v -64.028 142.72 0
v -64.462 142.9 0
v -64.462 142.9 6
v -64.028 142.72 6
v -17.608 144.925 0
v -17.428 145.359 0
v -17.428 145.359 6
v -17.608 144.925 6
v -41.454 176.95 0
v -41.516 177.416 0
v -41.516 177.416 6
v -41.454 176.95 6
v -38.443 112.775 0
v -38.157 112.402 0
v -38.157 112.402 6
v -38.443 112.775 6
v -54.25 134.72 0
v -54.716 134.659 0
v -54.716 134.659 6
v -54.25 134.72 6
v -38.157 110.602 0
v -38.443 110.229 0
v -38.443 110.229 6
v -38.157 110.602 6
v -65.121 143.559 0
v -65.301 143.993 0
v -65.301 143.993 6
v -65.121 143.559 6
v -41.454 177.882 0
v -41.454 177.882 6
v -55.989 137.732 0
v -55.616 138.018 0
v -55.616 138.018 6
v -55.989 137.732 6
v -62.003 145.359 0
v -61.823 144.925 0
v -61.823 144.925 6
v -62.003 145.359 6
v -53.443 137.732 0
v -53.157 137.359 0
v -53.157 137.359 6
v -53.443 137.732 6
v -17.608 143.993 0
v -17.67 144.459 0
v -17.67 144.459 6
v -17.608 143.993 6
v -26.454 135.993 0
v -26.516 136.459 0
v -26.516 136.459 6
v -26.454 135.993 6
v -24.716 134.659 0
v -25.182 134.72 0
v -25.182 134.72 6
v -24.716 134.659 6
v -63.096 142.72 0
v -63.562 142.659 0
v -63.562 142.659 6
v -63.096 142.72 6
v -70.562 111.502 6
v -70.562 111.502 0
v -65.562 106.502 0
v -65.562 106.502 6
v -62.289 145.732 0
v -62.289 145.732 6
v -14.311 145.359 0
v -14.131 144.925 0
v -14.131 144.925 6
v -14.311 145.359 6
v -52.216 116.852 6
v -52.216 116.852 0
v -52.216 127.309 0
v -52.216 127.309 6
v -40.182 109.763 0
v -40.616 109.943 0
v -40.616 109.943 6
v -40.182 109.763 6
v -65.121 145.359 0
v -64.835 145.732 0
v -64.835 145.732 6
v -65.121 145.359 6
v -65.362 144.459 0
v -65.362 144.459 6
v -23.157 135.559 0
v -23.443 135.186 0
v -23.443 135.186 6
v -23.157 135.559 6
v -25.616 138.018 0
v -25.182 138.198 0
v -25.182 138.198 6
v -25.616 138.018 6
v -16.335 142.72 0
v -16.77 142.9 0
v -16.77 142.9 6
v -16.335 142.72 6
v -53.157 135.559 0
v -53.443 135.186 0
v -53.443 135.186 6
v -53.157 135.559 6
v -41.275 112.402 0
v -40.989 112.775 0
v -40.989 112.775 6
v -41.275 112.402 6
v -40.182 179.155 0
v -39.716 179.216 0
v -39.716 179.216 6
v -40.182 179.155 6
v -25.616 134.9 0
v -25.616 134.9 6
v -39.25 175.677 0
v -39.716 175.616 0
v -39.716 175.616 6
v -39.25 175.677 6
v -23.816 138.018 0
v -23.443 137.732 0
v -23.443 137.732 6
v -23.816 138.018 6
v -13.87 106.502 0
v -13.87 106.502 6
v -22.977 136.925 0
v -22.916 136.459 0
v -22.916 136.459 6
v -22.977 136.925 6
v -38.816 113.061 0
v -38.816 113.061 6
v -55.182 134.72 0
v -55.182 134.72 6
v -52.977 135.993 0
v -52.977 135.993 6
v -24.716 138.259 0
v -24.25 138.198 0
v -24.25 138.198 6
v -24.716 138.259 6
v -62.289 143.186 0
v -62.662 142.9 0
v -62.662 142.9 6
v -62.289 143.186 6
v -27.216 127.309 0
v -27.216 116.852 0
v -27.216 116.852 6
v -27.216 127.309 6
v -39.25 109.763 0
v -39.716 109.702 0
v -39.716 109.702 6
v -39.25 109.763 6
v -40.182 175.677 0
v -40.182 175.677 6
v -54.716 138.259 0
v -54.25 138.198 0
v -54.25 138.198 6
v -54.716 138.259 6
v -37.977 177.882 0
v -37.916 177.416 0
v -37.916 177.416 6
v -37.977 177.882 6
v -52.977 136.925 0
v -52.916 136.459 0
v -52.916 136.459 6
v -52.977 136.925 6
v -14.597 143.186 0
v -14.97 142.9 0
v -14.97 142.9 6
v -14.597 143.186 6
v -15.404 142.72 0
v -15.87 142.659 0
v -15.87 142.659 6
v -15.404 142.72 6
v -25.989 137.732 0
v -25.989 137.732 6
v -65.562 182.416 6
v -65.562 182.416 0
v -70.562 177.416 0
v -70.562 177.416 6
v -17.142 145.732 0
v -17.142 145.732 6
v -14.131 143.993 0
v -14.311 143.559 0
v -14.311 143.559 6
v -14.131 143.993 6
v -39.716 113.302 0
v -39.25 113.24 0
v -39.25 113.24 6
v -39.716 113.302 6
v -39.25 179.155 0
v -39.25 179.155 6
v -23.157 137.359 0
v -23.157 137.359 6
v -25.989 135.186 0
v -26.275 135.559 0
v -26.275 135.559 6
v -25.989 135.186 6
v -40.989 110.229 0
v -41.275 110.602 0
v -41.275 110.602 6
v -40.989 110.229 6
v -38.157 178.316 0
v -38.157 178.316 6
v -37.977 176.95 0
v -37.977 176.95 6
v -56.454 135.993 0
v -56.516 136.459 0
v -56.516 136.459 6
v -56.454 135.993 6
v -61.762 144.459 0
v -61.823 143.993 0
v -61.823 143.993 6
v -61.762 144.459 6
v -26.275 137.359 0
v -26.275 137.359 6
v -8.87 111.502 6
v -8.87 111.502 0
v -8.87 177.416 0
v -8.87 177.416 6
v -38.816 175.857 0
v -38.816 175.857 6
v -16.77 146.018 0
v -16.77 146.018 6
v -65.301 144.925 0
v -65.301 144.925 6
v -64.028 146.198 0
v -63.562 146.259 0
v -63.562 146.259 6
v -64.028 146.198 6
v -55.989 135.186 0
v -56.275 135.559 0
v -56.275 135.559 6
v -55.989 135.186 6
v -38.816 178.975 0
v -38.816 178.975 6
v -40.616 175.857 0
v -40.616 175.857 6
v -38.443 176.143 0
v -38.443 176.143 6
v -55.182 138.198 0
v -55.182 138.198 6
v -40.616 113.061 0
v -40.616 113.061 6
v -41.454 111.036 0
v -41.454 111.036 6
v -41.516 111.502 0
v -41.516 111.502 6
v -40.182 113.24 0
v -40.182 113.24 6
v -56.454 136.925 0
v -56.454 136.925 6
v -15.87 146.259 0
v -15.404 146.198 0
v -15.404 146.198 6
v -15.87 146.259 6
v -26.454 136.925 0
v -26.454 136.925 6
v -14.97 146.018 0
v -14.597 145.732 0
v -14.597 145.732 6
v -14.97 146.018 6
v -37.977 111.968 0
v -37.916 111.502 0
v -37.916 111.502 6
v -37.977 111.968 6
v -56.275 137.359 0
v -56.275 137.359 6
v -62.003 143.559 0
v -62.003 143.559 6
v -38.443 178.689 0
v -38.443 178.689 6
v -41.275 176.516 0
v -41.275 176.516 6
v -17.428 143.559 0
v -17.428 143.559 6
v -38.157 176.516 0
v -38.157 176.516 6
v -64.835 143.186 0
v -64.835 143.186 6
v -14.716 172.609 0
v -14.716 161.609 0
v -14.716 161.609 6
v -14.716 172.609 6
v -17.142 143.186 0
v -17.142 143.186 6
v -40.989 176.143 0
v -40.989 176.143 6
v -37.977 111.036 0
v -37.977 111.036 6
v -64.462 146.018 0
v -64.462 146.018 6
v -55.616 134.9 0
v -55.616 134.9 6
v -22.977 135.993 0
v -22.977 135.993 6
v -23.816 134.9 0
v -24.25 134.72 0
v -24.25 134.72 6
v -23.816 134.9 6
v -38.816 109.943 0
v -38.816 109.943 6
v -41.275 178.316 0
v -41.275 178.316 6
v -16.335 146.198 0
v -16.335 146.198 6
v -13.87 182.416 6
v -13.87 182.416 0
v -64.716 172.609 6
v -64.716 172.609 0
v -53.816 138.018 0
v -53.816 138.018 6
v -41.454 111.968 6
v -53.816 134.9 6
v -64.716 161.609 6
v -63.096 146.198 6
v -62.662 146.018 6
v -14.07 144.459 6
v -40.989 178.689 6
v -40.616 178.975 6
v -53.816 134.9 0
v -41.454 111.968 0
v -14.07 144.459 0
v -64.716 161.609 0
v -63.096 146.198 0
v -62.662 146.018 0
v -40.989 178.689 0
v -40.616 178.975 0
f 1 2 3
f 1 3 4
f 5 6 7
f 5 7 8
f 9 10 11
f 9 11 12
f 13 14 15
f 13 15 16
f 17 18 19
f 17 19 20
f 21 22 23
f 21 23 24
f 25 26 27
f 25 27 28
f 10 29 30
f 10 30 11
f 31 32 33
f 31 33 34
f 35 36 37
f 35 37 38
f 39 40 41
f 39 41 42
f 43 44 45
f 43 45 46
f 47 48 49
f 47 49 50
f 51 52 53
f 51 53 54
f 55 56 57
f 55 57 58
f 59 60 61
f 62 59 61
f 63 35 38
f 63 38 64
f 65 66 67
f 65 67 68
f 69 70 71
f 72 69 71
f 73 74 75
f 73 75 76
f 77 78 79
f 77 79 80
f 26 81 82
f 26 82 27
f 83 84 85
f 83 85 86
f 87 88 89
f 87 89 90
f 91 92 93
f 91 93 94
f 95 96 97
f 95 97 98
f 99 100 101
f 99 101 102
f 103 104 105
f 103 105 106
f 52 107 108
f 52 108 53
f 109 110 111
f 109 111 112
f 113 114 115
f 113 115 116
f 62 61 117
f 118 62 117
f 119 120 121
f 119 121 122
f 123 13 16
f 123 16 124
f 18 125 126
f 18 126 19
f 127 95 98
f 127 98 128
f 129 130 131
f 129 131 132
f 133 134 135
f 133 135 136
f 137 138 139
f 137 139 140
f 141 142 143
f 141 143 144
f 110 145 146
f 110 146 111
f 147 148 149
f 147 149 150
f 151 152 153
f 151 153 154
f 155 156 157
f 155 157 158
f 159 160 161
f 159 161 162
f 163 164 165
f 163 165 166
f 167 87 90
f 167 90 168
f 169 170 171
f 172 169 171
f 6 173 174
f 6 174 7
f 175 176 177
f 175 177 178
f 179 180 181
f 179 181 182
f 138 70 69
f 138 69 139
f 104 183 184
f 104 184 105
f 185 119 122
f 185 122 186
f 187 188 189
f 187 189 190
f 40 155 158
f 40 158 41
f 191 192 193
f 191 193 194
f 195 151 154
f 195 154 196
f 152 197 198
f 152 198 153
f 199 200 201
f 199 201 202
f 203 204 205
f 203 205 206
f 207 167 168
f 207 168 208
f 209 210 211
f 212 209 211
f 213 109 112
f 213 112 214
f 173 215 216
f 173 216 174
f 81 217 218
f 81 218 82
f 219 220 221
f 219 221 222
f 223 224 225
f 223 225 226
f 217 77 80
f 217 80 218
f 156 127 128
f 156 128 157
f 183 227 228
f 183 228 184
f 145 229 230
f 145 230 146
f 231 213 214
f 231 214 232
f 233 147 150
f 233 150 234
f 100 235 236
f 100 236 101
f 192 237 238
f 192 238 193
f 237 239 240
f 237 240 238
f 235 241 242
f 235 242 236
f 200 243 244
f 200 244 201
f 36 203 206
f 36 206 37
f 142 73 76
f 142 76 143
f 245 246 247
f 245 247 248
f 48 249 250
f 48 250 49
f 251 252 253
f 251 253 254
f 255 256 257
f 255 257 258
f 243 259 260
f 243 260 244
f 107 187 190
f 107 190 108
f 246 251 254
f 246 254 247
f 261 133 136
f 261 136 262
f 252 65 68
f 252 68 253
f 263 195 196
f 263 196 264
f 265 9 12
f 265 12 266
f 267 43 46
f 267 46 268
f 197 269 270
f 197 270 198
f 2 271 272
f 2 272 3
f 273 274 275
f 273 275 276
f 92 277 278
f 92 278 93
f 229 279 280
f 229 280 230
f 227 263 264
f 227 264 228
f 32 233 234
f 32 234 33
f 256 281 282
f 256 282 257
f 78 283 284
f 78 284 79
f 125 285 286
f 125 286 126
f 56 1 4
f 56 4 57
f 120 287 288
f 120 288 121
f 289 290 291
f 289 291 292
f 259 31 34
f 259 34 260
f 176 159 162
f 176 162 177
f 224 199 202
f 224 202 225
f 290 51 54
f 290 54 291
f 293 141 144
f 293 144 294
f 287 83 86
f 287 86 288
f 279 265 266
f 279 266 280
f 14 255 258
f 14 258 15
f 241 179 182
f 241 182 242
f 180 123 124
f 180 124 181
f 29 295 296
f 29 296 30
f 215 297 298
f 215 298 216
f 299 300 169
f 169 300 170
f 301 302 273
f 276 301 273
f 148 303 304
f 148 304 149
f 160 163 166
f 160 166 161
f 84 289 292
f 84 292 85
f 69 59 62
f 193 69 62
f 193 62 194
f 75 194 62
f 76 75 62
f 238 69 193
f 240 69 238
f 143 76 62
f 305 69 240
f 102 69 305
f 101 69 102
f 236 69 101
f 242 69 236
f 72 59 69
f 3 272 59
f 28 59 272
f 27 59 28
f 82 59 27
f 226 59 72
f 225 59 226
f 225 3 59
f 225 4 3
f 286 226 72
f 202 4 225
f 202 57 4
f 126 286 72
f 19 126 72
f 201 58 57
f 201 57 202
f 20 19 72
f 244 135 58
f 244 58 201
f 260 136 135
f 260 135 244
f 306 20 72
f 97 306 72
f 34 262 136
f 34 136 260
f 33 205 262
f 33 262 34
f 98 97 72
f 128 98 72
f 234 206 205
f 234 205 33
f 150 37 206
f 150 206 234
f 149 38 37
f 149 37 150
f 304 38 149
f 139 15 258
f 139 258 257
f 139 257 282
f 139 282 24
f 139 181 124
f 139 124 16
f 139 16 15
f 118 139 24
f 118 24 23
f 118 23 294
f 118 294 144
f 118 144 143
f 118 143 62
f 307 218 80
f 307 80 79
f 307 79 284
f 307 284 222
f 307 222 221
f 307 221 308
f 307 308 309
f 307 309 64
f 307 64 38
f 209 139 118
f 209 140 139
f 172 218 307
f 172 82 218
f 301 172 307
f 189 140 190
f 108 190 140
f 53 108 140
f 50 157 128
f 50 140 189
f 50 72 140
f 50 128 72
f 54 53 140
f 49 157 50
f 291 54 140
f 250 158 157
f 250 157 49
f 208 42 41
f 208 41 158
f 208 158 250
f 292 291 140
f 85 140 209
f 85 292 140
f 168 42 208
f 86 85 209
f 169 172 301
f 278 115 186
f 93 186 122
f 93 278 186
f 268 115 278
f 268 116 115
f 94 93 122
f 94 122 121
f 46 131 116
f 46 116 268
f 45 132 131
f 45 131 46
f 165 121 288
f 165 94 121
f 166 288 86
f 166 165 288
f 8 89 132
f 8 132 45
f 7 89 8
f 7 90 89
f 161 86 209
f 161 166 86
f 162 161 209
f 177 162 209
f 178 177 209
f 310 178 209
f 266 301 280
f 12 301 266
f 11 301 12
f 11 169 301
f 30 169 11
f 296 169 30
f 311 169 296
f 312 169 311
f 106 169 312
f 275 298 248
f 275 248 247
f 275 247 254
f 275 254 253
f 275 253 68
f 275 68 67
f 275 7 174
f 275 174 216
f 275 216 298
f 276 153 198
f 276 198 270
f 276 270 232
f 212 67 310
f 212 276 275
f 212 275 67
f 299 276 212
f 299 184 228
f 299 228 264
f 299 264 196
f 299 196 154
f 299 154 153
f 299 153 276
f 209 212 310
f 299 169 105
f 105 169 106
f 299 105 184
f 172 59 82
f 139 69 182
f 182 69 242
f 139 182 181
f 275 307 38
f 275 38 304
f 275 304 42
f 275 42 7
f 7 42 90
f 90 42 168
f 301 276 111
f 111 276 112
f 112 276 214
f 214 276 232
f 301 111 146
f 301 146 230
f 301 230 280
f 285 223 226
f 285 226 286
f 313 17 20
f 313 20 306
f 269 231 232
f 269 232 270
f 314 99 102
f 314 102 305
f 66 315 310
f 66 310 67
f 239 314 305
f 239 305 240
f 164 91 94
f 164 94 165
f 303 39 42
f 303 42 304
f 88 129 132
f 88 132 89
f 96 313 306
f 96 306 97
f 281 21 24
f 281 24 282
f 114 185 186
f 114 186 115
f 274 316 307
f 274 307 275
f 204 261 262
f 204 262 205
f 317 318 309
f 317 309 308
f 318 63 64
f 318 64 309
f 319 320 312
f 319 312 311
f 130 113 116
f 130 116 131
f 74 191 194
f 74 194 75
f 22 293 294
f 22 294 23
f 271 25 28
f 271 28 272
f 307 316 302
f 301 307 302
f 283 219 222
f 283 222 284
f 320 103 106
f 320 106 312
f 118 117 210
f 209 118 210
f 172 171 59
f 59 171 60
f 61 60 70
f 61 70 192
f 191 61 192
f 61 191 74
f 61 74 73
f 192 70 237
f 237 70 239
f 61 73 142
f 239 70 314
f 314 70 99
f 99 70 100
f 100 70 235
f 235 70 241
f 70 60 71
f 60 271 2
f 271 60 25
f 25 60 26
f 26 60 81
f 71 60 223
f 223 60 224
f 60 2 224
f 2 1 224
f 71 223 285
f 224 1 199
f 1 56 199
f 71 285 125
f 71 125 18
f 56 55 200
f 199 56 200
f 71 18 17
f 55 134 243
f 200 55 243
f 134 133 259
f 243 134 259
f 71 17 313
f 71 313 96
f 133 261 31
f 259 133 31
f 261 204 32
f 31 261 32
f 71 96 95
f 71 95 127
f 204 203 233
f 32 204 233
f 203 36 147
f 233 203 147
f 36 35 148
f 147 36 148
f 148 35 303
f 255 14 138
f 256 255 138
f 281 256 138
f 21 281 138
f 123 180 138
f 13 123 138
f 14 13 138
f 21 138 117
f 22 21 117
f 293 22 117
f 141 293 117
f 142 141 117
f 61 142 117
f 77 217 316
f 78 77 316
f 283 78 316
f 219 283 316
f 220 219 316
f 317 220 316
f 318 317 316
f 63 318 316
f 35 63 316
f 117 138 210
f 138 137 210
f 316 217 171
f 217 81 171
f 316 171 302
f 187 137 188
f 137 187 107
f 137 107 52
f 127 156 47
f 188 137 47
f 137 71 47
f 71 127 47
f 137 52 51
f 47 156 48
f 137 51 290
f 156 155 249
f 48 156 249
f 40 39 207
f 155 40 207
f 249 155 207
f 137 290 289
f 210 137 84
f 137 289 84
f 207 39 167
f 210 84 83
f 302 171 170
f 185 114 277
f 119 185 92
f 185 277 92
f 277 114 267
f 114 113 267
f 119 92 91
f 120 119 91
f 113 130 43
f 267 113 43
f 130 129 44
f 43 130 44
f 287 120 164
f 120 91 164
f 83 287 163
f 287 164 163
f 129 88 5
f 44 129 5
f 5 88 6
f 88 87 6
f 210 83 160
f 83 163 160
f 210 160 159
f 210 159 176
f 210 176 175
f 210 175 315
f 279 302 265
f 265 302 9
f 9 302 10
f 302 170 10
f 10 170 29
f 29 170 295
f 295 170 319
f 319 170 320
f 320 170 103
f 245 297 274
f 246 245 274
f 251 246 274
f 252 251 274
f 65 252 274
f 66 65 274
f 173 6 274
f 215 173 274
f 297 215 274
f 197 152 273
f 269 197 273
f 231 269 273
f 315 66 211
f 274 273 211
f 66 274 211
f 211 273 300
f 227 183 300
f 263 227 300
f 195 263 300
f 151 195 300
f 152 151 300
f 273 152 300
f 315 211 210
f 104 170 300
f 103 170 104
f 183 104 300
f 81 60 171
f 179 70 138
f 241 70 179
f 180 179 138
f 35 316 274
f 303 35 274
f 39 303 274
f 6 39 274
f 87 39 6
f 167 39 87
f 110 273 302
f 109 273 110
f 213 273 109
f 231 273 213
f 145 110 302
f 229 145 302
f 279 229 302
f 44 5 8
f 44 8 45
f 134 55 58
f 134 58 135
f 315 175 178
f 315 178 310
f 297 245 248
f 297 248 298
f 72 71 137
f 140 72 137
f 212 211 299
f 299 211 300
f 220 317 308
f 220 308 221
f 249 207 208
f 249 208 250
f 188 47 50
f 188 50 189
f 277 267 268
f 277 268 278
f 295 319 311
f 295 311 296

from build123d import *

# Parameters (mm, degrees)
SKETCH1_W           = 24.999989911
SKETCH1_H           = 10.457138345
SKETCH1_W_2         = 49.999979697
SKETCH1_H_2         = 10.999995004
BOSS_EXTRUDE1_DEPTH = 6


with BuildPart() as part:
    # Sketch1 → Boss-Extrude1 (new body)
    with BuildSketch(Plane.XY):
        Polygon((-65.562023318, 106.501824812), (-13.869587203, 106.501824812), (-8.869589203, 111.501822737), (-8.86958929, 177.416081581), (-13.869587182, 182.416079474), (-65.562023318, 182.416079474), (-70.562021318, 177.416081474), (-70.562021318, 111.501822812), align=None)
        with Locations((-39.715805178, 122.080389652)):
            Rectangle(SKETCH1_W, SKETCH1_H, mode=Mode.SUBTRACT)
        with Locations((-39.715804889, 167.108942347)):
            Rectangle(SKETCH1_W_2, SKETCH1_H_2, mode=Mode.SUBTRACT)
        Polygon((-64.027895413, 142.720286351), (-63.562021318, 142.658952863), (-63.096147223, 142.720286351), (-62.662021678, 142.90010704), (-62.289229621, 143.186160446), (-62.003176215, 143.558952503), (-61.823355526, 143.993078048), (-61.762022038, 144.458952143), (-61.823355526, 144.924826238), (-62.003176215, 145.358951783), (-62.289229621, 145.73174384), (-62.662021678, 146.017797246), (-63.096147223, 146.197617935), (-63.562021318, 146.258951423), (-64.027895413, 146.197617935), (-64.462020958, 146.017797246), (-64.834813015, 145.73174384), (-65.120866421, 145.358951783), (-65.30068711, 144.924826238), (-65.362020598, 144.458952143), (-65.30068711, 143.993078048), (-65.120866421, 143.558952503), (-64.834813015, 143.186160446), (-64.462020958, 142.90010704), align=None, mode=Mode.SUBTRACT)
        Polygon((-15.869589241, 146.258951423), (-16.335463335, 146.197617935), (-16.769588881, 146.017797246), (-17.142380938, 145.73174384), (-17.428434344, 145.358951783), (-17.608255032, 144.924826238), (-17.669588521, 144.458952143), (-17.608255032, 143.993078048), (-17.428434344, 143.558952503), (-17.142380938, 143.186160446), (-16.769588881, 142.90010704), (-16.335463335, 142.720286351), (-15.869589241, 142.658952863), (-15.403715146, 142.720286351), (-14.969589601, 142.90010704), (-14.596797544, 143.186160446), (-14.310744137, 143.558952503), (-14.130923449, 143.993078048), (-14.069589961, 144.458952143), (-14.130923449, 144.924826238), (-14.310744137, 145.358951783), (-14.596797544, 145.73174384), (-14.969589601, 146.017797246), (-15.403715146, 146.197617935), align=None, mode=Mode.SUBTRACT)
        Polygon((-37.977139407, 111.967698907), (-38.156960096, 112.401824452), (-38.443013502, 112.774616509), (-38.815805559, 113.060669915), (-39.249931104, 113.240490604), (-39.715805199, 113.301824092), (-40.181679294, 113.240490604), (-40.615804839, 113.060669915), (-40.988596896, 112.774616509), (-41.274650303, 112.401824452), (-41.454470991, 111.967698907), (-41.515804479, 111.501824812), (-41.454470991, 111.035950717), (-41.274650303, 110.601825172), (-40.988596896, 110.229033115), (-40.615804839, 109.942979709), (-40.181679294, 109.76315902), (-39.715805199, 109.701825532), (-39.249931104, 109.76315902), (-38.815805559, 109.942979709), (-38.443013502, 110.229033115), (-38.156960096, 110.601825172), (-37.977139407, 111.035950717), (-37.915805919, 111.501824812), align=None, mode=Mode.SUBTRACT)
        Polygon((-37.977139407, 176.950205359), (-37.915805919, 177.416079454), (-37.977139407, 177.881953549), (-38.156960096, 178.316079094), (-38.443013502, 178.688871151), (-38.815805559, 178.974924557), (-39.249931104, 179.154745246), (-39.715805199, 179.216078734), (-40.181679294, 179.154745246), (-40.615804839, 178.974924557), (-40.988596896, 178.688871151), (-41.274650303, 178.316079094), (-41.454470991, 177.881953549), (-41.515804479, 177.416079454), (-41.454470991, 176.950205359), (-41.274650303, 176.516079814), (-40.988596896, 176.143287757), (-40.615804839, 175.857234351), (-40.181679294, 175.677413662), (-39.715805199, 175.616080174), (-39.249931104, 175.677413662), (-38.815805559, 175.857234351), (-38.443013502, 176.143287757), (-38.156960096, 176.516079814), align=None, mode=Mode.SUBTRACT)
        Polygon((-55.181679294, 134.720286351), (-54.715805199, 134.658952863), (-54.249931104, 134.720286351), (-53.815805559, 134.90010704), (-53.443013502, 135.186160446), (-53.156960096, 135.558952503), (-52.977139407, 135.993078048), (-52.915805919, 136.458952143), (-52.977139407, 136.924826238), (-53.156960096, 137.358951783), (-53.443013502, 137.73174384), (-53.815805559, 138.017797246), (-54.249931104, 138.197617935), (-54.715805199, 138.258951423), (-55.181679294, 138.197617935), (-55.615804839, 138.017797246), (-55.988596896, 137.73174384), (-56.274650303, 137.358951783), (-56.454470991, 136.924826238), (-56.515804479, 136.458952143), (-56.454470991, 135.993078048), (-56.274650303, 135.558952503), (-55.988596896, 135.186160446), (-55.615804839, 134.90010704), align=None, mode=Mode.SUBTRACT)
        Polygon((-23.156960096, 137.358951783), (-23.443013502, 137.73174384), (-23.815805559, 138.017797246), (-24.249931104, 138.197617935), (-24.715805199, 138.258951423), (-25.181679294, 138.197617935), (-25.615804839, 138.017797246), (-25.988596896, 137.73174384), (-26.274650303, 137.358951783), (-26.454470991, 136.924826238), (-26.515804479, 136.458952143), (-26.454470991, 135.993078048), (-26.274650303, 135.558952503), (-25.988596896, 135.186160446), (-25.615804839, 134.90010704), (-25.181679294, 134.720286351), (-24.715805199, 134.658952863), (-24.249931104, 134.720286351), (-23.815805559, 134.90010704), (-23.443013502, 135.186160446), (-23.156960096, 135.558952503), (-22.977139407, 135.993078048), (-22.915805919, 136.458952143), (-22.977139407, 136.924826238), align=None, mode=Mode.SUBTRACT)
    extrude(amount=BOSS_EXTRUDE1_DEPTH)


solid = part.part
